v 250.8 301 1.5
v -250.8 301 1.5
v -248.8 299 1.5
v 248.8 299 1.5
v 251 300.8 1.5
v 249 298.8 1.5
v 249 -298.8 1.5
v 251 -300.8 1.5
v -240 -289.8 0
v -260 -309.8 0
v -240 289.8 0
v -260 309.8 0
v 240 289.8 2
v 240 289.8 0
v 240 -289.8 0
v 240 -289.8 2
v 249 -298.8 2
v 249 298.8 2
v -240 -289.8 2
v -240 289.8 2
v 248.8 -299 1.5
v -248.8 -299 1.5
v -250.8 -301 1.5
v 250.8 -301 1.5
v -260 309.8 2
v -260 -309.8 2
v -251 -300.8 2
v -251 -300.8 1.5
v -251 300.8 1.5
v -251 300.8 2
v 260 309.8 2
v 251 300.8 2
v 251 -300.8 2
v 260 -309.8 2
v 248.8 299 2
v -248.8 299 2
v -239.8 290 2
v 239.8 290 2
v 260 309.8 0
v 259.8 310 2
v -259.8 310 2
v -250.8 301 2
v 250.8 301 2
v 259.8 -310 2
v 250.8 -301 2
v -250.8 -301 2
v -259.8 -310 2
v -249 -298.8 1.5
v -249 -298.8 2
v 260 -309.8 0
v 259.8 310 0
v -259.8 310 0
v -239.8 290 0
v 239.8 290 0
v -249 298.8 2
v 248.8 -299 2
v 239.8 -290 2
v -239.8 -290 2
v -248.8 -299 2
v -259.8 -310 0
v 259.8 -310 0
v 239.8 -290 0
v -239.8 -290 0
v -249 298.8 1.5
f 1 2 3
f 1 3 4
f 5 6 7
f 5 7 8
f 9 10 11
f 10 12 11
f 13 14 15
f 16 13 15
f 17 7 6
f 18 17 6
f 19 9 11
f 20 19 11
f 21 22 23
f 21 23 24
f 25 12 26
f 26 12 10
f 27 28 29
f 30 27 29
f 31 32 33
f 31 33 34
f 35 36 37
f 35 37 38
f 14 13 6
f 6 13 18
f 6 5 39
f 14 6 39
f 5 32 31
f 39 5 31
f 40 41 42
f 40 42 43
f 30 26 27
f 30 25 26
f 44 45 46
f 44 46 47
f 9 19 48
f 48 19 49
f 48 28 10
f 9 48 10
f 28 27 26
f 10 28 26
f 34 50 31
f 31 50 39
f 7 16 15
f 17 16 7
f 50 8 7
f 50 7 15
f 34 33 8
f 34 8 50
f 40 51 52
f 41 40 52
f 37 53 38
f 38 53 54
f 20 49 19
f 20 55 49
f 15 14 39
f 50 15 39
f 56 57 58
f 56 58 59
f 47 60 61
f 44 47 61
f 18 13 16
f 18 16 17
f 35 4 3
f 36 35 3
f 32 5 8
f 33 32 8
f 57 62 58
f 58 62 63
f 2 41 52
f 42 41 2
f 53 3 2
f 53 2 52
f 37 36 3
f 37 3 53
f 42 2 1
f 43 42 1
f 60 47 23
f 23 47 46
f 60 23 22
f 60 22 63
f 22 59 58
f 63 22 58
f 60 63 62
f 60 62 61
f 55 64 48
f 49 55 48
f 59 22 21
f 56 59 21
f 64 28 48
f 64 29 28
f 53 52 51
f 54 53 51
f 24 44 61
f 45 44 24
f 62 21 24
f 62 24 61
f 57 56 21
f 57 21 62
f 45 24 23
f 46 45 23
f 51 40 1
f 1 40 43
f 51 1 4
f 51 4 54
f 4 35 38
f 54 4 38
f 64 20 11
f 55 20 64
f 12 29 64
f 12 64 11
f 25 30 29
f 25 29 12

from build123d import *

# Parameters (mm, degrees)
CROQUIS1_W                = 498
CROQUIS1_H                = 598
CROQUIS1_W_2              = 480
CROQUIS1_H_2              = 580
SALIENTE_EXTRUIR1_DEPTH   = 2
CROQUIS1_W_3              = 520
CROQUIS1_H_3              = 620
CROQUIS1_W_4              = 502
CROQUIS1_H_4              = 602
SALIENTE_EXTRUIR1_2_DEPTH = 2
CROQUIS1_3_W              = 502
CROQUIS1_3_H              = 602
CROQUIS1_3_W_2            = 498
CROQUIS1_3_H_2            = 598
SALIENTE_EXTRUIR2_DEPTH   = 1.5
CORTAR_EXTRUIR1_DEPTH     = 21


with BuildPart() as part:
    # Croquis1 → Saliente-Extruir1 (new body)
    with BuildSketch(Plane.XY):
        Rectangle(CROQUIS1_W, CROQUIS1_H)
        Rectangle(CROQUIS1_W_2, CROQUIS1_H_2, mode=Mode.SUBTRACT)
    extrude(amount=SALIENTE_EXTRUIR1_DEPTH)



with BuildPart() as body_2:
    # Croquis1 → Saliente-Extruir1 2 (new body)
    with BuildSketch(Plane.XY):
        Rectangle(CROQUIS1_W_3, CROQUIS1_H_3)
        Rectangle(CROQUIS1_W_4, CROQUIS1_H_4, mode=Mode.SUBTRACT)
    extrude(amount=SALIENTE_EXTRUIR1_2_DEPTH)


with BuildPart() as part_1:
    add(part.part)

    add(body_2.part)  # Saliente-Extruir2 merges body 2
    # Croquis1<3> → Saliente-Extruir2 (add)
    with BuildSketch(Plane.XY):
        Rectangle(CROQUIS1_3_W, CROQUIS1_3_H)
        Rectangle(CROQUIS1_3_W_2, CROQUIS1_3_H_2, mode=Mode.SUBTRACT)
    extrude(amount=SALIENTE_EXTRUIR2_DEPTH)

    # Croquis2 → Cortar-Extruir1 (cut)
    with BuildSketch(Plane.XY.offset(2)):
        Polygon((-240, 289.8), (-260, 309.8), (-260, 310), (-259.8, 310), (-239.8, 290), (-240, 290), align=None)
        Polygon((240, 290), (240, 289.8), (260, 309.8), (260, 310), (259.8, 310), (239.8, 290), align=None)
        Polygon((240, -289.8), (260, -309.8), (260, -310), (259.8, -310), (239.8, -290), (240, -290), align=None)
        Polygon((-240, -290), (-240, -289.8), (-260, -309.8), (-260, -310), (-259.8, -310), (-239.8, -290), align=None)
    extrude(amount=-CORTAR_EXTRUIR1_DEPTH, mode=Mode.SUBTRACT)


with BuildPart() as cortar_extruir1_piece_1:
    # of the separate pieces the step leaves, piece 1, a body of its own (cortar_extruir1_pieces)
    add(part_1.part.solids().sort_by_distance((-249, -298.8, 1.5))[0])


with BuildPart() as cortar_extruir1_piece_2:
    # of the separate pieces the step leaves, piece 2, a body of its own (cortar_extruir1_pieces)
    add(part_1.part.solids().sort_by_distance((249, -298.8, 2))[0])


with BuildPart() as cortar_extruir1_piece_3:
    # of the separate pieces the step leaves, piece 3, a body of its own (cortar_extruir1_pieces)
    add(part_1.part.solids().sort_by_distance((248.8, -299, 2))[0])


with BuildPart() as cortar_extruir1_piece_4:
    # of the separate pieces the step leaves, piece 4, a body of its own (cortar_extruir1_pieces)
    add(part_1.part.solids().sort_by_distance((248.8, 299, 2))[0])


solid = Compound([cortar_extruir1_piece_1.part, cortar_extruir1_piece_2.part, cortar_extruir1_piece_3.part, cortar_extruir1_piece_4.part])
